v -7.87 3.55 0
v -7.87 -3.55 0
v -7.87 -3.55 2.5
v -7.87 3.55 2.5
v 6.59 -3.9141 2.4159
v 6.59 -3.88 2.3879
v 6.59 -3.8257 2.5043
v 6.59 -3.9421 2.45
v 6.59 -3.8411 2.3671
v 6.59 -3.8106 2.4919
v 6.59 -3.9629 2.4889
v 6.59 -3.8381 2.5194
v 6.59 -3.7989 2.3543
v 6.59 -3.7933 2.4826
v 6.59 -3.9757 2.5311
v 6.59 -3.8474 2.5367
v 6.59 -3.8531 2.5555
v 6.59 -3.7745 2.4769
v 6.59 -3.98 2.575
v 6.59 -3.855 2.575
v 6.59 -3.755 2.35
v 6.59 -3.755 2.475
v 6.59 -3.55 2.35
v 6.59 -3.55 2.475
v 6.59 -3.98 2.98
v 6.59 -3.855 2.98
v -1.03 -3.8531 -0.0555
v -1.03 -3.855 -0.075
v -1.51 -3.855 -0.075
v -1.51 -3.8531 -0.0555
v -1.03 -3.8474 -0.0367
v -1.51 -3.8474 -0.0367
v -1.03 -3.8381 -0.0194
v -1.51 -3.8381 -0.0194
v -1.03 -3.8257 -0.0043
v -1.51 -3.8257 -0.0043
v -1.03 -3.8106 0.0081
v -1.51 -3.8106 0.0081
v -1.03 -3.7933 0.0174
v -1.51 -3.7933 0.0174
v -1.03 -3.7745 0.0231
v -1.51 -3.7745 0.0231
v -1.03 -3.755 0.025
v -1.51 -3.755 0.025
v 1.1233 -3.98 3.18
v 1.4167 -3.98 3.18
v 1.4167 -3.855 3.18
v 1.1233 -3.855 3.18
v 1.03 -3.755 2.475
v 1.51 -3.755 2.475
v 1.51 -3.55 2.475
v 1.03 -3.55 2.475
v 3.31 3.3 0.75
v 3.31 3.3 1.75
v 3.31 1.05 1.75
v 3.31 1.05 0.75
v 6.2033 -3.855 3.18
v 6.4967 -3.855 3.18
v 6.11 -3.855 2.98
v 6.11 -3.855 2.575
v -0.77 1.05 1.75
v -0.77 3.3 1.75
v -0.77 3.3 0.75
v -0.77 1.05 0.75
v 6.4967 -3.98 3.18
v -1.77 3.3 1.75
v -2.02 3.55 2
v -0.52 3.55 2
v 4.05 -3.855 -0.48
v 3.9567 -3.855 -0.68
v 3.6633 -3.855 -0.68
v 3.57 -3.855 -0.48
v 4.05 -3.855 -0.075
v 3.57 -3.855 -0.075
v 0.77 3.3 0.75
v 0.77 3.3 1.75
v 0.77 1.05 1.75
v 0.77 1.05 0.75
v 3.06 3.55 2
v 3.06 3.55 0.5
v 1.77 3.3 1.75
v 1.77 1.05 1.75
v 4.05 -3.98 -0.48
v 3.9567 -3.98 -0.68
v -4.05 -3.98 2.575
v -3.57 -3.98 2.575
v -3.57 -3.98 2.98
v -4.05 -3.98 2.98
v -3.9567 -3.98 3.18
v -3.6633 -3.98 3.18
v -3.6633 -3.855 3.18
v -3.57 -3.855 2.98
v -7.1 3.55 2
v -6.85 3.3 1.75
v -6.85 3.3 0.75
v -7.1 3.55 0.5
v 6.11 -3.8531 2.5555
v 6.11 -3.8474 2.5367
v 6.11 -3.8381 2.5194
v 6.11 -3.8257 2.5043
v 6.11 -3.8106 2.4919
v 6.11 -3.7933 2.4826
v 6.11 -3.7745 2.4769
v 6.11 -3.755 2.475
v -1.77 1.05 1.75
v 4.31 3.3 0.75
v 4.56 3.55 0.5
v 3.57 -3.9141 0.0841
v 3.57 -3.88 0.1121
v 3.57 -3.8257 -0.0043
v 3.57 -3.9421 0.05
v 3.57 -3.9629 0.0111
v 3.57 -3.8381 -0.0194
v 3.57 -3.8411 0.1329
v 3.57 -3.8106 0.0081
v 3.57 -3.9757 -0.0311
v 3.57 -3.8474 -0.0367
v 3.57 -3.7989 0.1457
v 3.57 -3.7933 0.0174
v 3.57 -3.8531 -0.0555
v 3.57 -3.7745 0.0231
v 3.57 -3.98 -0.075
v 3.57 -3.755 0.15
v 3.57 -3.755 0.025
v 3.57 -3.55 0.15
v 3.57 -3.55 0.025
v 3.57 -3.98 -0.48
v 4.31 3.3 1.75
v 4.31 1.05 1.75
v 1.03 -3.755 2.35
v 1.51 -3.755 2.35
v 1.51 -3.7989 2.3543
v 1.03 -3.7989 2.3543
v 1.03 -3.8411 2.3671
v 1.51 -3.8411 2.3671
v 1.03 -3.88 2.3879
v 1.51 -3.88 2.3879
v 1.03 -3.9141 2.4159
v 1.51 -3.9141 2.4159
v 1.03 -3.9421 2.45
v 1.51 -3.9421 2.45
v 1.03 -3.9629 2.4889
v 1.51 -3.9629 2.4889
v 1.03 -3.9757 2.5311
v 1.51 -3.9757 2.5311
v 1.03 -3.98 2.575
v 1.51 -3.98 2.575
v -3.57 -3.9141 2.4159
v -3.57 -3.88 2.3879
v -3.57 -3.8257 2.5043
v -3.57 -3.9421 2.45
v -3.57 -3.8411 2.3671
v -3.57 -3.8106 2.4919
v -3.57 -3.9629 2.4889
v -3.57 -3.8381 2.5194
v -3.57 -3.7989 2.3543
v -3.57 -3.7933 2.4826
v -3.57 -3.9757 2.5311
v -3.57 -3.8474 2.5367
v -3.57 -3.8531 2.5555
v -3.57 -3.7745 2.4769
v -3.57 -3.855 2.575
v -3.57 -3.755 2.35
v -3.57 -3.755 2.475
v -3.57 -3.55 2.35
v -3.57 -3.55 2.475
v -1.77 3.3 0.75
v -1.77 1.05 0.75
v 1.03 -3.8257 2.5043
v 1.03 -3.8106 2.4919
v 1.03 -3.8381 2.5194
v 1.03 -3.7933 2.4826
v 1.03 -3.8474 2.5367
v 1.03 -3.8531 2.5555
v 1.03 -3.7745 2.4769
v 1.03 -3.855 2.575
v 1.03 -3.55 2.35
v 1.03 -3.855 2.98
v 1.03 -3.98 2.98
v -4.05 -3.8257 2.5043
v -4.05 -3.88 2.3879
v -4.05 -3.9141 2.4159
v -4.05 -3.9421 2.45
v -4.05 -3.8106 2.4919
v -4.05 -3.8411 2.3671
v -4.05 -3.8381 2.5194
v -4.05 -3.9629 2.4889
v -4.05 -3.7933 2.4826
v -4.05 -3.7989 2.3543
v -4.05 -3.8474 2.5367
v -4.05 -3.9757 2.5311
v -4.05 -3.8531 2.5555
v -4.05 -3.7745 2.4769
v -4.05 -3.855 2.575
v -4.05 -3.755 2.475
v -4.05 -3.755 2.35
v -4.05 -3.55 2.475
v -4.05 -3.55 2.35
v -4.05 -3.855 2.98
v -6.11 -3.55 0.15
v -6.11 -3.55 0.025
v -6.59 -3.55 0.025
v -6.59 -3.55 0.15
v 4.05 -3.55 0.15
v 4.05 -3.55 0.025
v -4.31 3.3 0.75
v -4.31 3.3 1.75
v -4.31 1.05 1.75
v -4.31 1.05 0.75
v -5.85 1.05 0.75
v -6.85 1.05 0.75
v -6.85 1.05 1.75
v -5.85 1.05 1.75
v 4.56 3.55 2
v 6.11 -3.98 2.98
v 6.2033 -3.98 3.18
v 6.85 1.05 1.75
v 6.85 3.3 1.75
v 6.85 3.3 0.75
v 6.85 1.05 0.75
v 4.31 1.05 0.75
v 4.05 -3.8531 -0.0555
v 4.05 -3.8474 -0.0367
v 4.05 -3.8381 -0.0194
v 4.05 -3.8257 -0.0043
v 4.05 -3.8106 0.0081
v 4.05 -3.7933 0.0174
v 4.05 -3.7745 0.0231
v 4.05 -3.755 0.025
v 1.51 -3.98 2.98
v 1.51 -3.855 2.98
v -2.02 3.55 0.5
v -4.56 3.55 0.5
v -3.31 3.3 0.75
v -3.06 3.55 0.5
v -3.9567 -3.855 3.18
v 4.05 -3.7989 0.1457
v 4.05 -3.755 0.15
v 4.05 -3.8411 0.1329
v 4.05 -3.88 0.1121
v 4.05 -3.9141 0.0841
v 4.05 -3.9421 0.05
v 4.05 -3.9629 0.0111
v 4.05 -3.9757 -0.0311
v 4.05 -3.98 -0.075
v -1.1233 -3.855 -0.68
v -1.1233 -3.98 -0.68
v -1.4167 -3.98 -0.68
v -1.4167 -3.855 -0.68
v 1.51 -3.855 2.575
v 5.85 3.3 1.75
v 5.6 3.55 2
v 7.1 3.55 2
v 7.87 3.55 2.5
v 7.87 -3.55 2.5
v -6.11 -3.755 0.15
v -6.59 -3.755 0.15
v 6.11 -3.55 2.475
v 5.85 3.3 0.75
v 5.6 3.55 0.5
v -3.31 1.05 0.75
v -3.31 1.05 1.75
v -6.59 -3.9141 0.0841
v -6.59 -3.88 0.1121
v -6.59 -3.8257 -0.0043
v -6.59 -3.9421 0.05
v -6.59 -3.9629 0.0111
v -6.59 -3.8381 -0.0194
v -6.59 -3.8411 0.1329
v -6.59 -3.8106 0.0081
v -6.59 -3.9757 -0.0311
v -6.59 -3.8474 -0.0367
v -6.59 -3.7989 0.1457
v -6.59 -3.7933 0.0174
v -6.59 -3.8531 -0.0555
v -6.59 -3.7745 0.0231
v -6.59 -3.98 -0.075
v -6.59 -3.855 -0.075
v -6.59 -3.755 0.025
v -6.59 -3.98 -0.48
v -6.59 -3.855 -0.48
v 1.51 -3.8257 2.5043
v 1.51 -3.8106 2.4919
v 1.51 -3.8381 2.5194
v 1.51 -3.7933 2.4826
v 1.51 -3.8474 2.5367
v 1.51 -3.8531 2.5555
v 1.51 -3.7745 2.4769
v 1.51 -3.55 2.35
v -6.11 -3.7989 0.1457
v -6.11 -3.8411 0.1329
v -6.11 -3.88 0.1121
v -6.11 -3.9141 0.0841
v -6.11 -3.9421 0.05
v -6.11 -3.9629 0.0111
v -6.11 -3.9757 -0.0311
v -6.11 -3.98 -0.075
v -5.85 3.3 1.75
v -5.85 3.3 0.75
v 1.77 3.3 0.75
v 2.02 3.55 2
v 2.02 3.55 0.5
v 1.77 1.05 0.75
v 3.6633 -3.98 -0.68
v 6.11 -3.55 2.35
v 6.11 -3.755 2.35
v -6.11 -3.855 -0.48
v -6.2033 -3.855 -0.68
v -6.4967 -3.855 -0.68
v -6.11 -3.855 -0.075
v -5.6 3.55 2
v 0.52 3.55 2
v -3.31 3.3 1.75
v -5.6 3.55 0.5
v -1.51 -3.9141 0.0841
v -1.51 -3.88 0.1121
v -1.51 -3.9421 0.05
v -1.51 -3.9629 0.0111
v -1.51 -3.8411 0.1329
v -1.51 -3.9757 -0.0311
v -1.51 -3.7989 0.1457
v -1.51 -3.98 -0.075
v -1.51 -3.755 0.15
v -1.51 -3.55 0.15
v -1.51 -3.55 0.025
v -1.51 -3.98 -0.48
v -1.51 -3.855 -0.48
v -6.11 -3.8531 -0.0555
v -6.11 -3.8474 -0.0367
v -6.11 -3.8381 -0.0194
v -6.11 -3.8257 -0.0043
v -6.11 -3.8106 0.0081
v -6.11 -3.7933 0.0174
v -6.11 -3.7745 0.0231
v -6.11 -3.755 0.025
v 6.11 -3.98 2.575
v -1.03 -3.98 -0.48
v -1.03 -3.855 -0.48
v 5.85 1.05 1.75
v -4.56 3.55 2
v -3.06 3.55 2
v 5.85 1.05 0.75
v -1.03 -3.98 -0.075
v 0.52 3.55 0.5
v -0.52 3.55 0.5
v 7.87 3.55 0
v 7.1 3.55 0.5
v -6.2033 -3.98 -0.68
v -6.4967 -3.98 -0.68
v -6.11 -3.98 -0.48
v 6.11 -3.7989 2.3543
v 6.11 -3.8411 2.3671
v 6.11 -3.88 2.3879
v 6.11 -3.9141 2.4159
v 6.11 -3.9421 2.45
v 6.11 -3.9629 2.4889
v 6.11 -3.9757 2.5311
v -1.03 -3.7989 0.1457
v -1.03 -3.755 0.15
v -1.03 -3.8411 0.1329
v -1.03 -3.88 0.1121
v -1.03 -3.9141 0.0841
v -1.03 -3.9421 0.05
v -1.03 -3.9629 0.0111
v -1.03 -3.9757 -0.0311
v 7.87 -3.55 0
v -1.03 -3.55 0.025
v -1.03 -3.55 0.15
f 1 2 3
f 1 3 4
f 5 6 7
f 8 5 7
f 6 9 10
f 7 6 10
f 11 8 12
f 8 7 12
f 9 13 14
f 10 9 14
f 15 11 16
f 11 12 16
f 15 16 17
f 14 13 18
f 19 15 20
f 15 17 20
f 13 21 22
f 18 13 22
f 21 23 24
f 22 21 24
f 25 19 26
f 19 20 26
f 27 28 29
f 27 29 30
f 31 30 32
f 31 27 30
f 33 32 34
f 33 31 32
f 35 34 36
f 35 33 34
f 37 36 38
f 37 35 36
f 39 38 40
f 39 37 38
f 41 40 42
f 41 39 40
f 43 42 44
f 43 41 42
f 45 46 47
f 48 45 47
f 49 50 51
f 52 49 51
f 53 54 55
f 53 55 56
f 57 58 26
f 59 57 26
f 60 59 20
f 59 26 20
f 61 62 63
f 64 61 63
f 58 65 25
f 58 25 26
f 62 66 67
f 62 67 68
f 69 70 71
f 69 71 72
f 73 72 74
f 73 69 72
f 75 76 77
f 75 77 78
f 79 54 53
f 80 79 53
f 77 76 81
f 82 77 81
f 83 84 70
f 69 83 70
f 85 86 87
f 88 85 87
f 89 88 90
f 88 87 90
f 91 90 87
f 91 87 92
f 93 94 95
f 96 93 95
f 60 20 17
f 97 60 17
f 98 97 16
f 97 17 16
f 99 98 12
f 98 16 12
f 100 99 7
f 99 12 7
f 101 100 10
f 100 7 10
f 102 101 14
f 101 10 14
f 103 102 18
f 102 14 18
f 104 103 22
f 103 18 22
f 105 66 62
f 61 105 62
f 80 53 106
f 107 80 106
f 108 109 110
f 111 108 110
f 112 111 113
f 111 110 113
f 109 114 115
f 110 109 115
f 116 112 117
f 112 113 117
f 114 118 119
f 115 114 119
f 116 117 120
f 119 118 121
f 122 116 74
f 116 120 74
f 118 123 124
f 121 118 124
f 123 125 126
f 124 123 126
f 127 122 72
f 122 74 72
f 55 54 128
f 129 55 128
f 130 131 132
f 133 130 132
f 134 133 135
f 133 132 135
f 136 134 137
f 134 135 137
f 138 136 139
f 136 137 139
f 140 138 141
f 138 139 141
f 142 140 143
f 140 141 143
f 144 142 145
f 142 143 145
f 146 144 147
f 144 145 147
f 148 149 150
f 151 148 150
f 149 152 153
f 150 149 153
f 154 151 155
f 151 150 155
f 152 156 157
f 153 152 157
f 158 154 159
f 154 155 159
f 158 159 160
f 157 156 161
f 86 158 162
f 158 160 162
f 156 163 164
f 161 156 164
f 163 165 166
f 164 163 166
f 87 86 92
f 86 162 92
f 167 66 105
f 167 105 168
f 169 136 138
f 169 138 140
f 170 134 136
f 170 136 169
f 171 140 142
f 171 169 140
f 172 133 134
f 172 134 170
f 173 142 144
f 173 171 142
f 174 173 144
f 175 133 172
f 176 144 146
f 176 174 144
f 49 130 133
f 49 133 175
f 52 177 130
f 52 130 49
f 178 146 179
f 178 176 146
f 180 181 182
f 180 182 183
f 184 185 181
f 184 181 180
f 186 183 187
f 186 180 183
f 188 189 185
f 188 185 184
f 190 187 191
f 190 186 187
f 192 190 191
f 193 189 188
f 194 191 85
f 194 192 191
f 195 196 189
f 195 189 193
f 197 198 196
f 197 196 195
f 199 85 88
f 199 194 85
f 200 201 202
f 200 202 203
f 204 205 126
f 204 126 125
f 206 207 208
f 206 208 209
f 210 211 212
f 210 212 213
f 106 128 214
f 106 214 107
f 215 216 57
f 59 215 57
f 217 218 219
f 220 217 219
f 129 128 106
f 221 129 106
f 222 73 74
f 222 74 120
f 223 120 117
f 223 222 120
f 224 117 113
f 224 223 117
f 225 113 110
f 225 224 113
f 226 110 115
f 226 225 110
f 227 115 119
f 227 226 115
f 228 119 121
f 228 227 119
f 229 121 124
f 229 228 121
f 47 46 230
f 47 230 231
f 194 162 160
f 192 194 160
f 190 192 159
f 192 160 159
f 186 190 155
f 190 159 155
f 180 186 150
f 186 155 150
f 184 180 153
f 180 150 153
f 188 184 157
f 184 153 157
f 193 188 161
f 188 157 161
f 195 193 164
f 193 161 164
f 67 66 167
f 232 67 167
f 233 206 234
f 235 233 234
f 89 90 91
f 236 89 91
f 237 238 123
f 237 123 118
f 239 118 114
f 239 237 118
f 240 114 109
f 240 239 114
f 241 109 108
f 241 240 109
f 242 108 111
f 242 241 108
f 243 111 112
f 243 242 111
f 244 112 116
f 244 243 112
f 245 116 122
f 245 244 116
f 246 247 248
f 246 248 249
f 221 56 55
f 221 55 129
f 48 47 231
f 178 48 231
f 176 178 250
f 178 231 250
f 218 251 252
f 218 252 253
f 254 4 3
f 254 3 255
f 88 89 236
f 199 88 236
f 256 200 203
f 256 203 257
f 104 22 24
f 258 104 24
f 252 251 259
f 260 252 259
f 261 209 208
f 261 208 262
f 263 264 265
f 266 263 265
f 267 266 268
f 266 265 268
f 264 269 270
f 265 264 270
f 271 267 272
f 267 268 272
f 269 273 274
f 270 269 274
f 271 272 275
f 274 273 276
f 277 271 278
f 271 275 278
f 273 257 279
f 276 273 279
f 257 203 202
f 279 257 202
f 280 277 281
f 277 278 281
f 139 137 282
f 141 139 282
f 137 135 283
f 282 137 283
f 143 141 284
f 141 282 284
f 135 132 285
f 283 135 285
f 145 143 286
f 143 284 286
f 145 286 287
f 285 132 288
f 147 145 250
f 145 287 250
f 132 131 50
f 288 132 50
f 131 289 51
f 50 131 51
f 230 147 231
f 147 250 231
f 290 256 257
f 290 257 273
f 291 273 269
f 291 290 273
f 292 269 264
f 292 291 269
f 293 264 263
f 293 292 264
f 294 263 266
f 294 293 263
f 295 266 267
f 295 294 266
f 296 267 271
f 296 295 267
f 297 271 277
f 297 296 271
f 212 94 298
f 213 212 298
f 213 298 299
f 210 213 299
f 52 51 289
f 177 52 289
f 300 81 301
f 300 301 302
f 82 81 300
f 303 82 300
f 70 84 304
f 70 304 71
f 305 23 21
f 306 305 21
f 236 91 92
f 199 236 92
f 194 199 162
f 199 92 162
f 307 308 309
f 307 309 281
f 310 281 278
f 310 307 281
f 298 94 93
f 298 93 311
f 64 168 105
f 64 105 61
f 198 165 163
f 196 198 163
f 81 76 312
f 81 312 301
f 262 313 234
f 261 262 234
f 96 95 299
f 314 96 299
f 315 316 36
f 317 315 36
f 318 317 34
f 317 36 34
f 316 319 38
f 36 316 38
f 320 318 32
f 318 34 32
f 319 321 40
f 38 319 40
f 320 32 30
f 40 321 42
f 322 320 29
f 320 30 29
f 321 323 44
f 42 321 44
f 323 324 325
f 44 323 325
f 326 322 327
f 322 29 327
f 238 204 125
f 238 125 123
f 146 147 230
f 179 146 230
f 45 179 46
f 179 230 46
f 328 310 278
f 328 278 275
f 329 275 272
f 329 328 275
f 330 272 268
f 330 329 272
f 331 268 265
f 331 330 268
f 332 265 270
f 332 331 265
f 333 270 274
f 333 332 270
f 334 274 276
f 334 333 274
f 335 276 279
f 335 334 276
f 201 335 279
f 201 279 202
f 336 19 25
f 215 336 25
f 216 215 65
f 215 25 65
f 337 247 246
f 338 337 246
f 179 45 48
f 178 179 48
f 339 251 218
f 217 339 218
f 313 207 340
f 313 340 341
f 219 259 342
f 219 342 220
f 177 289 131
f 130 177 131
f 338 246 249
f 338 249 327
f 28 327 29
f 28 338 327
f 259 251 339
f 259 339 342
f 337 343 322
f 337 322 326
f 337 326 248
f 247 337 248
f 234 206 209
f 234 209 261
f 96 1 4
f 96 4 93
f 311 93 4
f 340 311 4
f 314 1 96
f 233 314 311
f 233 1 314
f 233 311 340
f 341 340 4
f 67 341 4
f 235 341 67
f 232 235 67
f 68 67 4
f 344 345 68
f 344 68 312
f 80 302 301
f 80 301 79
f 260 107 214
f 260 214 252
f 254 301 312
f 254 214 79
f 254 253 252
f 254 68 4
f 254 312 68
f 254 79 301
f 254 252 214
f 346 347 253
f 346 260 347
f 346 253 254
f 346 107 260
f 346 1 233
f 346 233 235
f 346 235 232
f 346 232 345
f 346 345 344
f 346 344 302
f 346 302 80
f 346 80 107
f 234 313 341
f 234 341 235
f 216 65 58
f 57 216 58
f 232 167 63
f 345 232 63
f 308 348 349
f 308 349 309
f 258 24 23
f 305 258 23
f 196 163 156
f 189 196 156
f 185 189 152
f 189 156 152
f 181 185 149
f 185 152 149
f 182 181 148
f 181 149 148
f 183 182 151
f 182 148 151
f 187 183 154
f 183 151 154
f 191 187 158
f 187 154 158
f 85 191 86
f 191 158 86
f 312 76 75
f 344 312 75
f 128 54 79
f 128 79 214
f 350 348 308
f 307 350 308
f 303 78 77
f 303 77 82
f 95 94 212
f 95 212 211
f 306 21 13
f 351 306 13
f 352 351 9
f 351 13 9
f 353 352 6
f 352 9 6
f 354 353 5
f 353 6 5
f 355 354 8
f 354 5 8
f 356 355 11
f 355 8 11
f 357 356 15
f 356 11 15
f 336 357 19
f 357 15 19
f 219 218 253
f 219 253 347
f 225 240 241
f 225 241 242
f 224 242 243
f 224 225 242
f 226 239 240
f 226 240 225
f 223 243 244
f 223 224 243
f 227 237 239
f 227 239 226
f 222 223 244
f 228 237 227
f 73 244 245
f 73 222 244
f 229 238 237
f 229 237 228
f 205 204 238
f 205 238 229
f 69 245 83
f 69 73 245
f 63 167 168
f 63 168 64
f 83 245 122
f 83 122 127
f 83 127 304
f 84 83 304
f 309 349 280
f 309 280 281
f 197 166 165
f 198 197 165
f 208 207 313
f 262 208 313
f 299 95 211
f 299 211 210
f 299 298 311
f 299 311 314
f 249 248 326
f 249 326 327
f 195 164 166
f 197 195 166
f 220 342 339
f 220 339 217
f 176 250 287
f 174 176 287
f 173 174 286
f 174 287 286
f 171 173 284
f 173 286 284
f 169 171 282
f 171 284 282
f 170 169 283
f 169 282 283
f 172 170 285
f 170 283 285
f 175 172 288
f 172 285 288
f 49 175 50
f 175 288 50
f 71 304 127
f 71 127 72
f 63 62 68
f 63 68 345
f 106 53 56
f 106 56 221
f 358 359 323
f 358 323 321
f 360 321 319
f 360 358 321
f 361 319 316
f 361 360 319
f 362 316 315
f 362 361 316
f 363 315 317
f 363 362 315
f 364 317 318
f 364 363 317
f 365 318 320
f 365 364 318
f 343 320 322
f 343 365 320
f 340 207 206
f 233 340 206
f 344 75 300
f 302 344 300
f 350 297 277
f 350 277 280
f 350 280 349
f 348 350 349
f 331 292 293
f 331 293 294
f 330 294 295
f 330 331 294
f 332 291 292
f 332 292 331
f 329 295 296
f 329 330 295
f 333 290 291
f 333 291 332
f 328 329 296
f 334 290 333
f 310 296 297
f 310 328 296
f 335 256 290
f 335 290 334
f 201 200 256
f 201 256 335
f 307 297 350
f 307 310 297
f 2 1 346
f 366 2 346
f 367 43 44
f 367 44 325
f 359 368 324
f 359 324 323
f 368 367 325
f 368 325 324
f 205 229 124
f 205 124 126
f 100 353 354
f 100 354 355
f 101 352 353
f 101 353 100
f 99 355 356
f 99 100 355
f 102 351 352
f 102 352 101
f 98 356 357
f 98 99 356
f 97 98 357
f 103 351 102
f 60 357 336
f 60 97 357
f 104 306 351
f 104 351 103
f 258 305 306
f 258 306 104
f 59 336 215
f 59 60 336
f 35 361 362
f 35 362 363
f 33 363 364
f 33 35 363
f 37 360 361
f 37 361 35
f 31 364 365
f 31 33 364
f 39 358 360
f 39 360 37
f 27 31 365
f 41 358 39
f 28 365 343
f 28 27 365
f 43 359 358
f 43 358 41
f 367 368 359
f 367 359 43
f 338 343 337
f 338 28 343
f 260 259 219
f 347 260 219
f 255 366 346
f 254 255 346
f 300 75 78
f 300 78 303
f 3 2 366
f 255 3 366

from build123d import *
from OCP.BRepFilletAPI import BRepFilletAPI_MakeChamfer

# Parameters (mm, degrees)
SKETCH1_W                  = 15.74
SKETCH1_H                  = 7.1
BOSS_EXTRUDE1_DEPTH        = 2.5
SKETCH2_W                  = 1
SKETCH2_H                  = 1
CUT_EXTRUDE1_DEPTH         = 2.5
CHAMFER1_SIZE              = 0.25
LPATTERN6_COUNT            = 6
LPATTERN6_PITCH            = 2.54
CHAMFER1_OF_LPATTERN6_SIZE = 0.25
BASE_FLANGE2_DEPTH         = 0.24
BASE_FLANGE2_DEPTH_BACK    = 0.24
BASE_FLANGE3_DEPTH         = 0.24
BASE_FLANGE3_DEPTH_BACK    = 0.24
CHAMFER3_SIZE              = 0.2
CHAMFER3_SIZE2             = 0.093261532
CHAMFER4_SIZE              = 0.2
CHAMFER4_SIZE2             = 0.093261532
LPATTERN4_COUNT            = 3
LPATTERN4_PITCH            = 5.08
LPATTERN3_COUNT            = 3
LPATTERN3_PITCH            = 5.08


# Sheet-metal steps are written as plain solids
with BuildPart() as part:
    # Sketch1 → Boss-Extrude1 (new body)
    with BuildSketch(Plane.XY):
        Rectangle(SKETCH1_W, SKETCH1_H)
    extrude(amount=BOSS_EXTRUDE1_DEPTH)

    # Sketch2 → Cut-Extrude1 (cut)
    with BuildSketch(Plane(origin=(0, 3.55, 0), x_dir=(1, 0, 0), z_dir=(0, 1, 0))):
        with Locations((-6.35, -1.25)):
            Rectangle(SKETCH2_W, SKETCH2_H)
    cut_extrude1 = extrude(amount=-CUT_EXTRUDE1_DEPTH, mode=Mode.SUBTRACT)

    # Chamfer1
    chamfer1_edges = [part.edges().sort_by_distance(p)[0] for p in [
        (-5.85, 3.55, 1.25),
        (-6.35, 3.55, 0.75),
        (-6.85, 3.55, 1.25),
        (-6.35, 3.55, 1.75),
    ]]
    chamfer(chamfer1_edges, length=CHAMFER1_SIZE)

    # LPattern6: Cut-Extrude1 ×6
    with Locations(*[(i * LPATTERN6_PITCH, 0, 0) for i in range(1, LPATTERN6_COUNT)]):
        add(cut_extrude1, mode=Mode.SUBTRACT)

    # Chamfer1 of LPattern6
    chamfer1_of_lpattern6_edges = [part.edges().sort_by_distance(p)[0] for p in [
        (-3.31, 3.55, 1.25),
        (-3.81, 3.55, 0.75),
        (-4.31, 3.55, 1.25),
        (-3.81, 3.55, 1.75),
        (-0.77, 3.55, 1.25),
        (-1.27, 3.55, 0.75),
        (-1.77, 3.55, 1.25),
        (-1.27, 3.55, 1.75),
        (1.77, 3.55, 1.25),
        (1.27, 3.55, 0.75),
        (0.77, 3.55, 1.25),
        (1.27, 3.55, 1.75),
        (4.31, 3.55, 1.25),
        (3.81, 3.55, 0.75),
        (3.31, 3.55, 1.25),
        (3.81, 3.55, 1.75),
        (6.85, 3.55, 1.25),
        (6.35, 3.55, 0.75),
        (5.85, 3.55, 1.25),
        (6.35, 3.55, 1.75),
    ]]
    chamfer(chamfer1_of_lpattern6_edges, length=CHAMFER1_OF_LPATTERN6_SIZE)


with BuildPart() as body_2:
    # Sketch5 → Base-Flange2 (new, two sides: drawn at the far end of the back side and taken through both)
    with BuildSketch(Plane.ZY.offset(6.35).offset(-BASE_FLANGE2_DEPTH_BACK)):
        with BuildLine():
            Line((0.15, -3.55), (0.15, -3.755))
            ThreePointArc((0.15, -3.755), (0.084099026, -3.914099026), (-0.075, -3.98))
            Line((-0.075, -3.98), (-0.68, -3.98))
            Line((-0.68, -3.98), (-0.68, -3.855))
            Line((-0.68, -3.855), (-0.075, -3.855))
            ThreePointArc((-0.075, -3.855), (-0.004289322, -3.825710678), (0.025, -3.755))
            Line((0.025, -3.755), (0.025, -3.55))
            Line((0.025, -3.55), (0.15, -3.55))
        make_face()
    extrude(amount=BASE_FLANGE2_DEPTH + BASE_FLANGE2_DEPTH_BACK)

    # Chamfer4: one chamfer whose edges measure the first distance from different faces: ONE call of the kernel's chamfer builder (chamfer() names one face for all edges)
    chamfer4_edges_1 = [body_2.edges().sort_by_distance(p)[0] for p in [
        (-6.11, -3.9175, -0.68),
    ]]
    chamfer4_side_1 = [body_2.faces().sort_by_distance(p)[0] for p in [
        (-6.11, -3.6525, 0.034347727),
    ]]
    chamfer4_edges_2 = [body_2.edges().sort_by_distance(p)[0] for p in [
        (-6.59, -3.9175, -0.68),
    ]]
    chamfer4_side_2 = [body_2.faces().sort_by_distance(p)[0] for p in [
        (-6.59, -3.6525, 0.034347727),
    ]]
    chamfer4 = BRepFilletAPI_MakeChamfer(body_2.part.solid().wrapped)
    for e in chamfer4_edges_1:
        chamfer4.Add(CHAMFER4_SIZE, CHAMFER4_SIZE2, e.wrapped, chamfer4_side_1[0].wrapped)  # the first distance lies on this face
    for e in chamfer4_edges_2:
        chamfer4.Add(CHAMFER4_SIZE, CHAMFER4_SIZE2, e.wrapped, chamfer4_side_2[0].wrapped)  # the first distance lies on this face
    add(Compound.cast(chamfer4.Shape()), mode=Mode.REPLACE)


with BuildPart() as body_3:
    # Sketch22 → Base-Flange3 (new, two sides: drawn at the far end of the back side and taken through both)
    with BuildSketch(Plane.ZY.offset(3.81).offset(-BASE_FLANGE3_DEPTH_BACK)):
        with BuildLine():
            Line((2.35, -3.55), (2.35, -3.755))
            ThreePointArc((2.35, -3.755), (2.415900974, -3.914099026), (2.575, -3.98))
            Line((2.575, -3.98), (3.18, -3.98))
            Line((3.18, -3.98), (3.18, -3.855))
            Line((3.18, -3.855), (2.575, -3.855))
            ThreePointArc((2.575, -3.855), (2.504289322, -3.825710678), (2.475, -3.755))
            Line((2.475, -3.755), (2.475, -3.55))
            Line((2.475, -3.55), (2.35, -3.55))
        make_face()
    extrude(amount=BASE_FLANGE3_DEPTH + BASE_FLANGE3_DEPTH_BACK)

    # Chamfer3: one chamfer whose edges measure the first distance from different faces: ONE call of the kernel's chamfer builder (chamfer() names one face for all edges)
    chamfer3_edges_1 = [body_3.edges().sort_by_distance(p)[0] for p in [
        (-3.57, -3.9175, 3.18),
    ]]
    chamfer3_side_1 = [body_3.faces().sort_by_distance(p)[0] for p in [
        (-3.57, -3.6525, 2.465652273),
    ]]
    chamfer3_edges_2 = [body_3.edges().sort_by_distance(p)[0] for p in [
        (-4.05, -3.9175, 3.18),
    ]]
    chamfer3_side_2 = [body_3.faces().sort_by_distance(p)[0] for p in [
        (-4.05, -3.6525, 2.465652273),
    ]]
    chamfer3 = BRepFilletAPI_MakeChamfer(body_3.part.solid().wrapped)
    for e in chamfer3_edges_1:
        chamfer3.Add(CHAMFER3_SIZE, CHAMFER3_SIZE2, e.wrapped, chamfer3_side_1[0].wrapped)  # the first distance lies on this face
    for e in chamfer3_edges_2:
        chamfer3.Add(CHAMFER3_SIZE, CHAMFER3_SIZE2, e.wrapped, chamfer3_side_2[0].wrapped)  # the first distance lies on this face
    add(Compound.cast(chamfer3.Shape()), mode=Mode.REPLACE)


with BuildPart() as lpattern4_1:
    # LPattern4: pattern copy
    add(body_2.part.moved(Location(Vector(1, 0, 0) * (1 * LPATTERN4_PITCH))))


with BuildPart() as lpattern4_2:
    # LPattern4: pattern copy
    add(body_2.part.moved(Location(Vector(1, 0, 0) * (2 * LPATTERN4_PITCH))))


with BuildPart() as lpattern3_1:
    # LPattern3: pattern copy
    add(body_3.part.moved(Location(Vector(1, 0, 0) * (1 * LPATTERN3_PITCH))))


with BuildPart() as lpattern3_2:
    # LPattern3: pattern copy
    add(body_3.part.moved(Location(Vector(1, 0, 0) * (2 * LPATTERN3_PITCH))))


solid = Compound([part.part, body_2.part, body_3.part, lpattern4_1.part, lpattern4_2.part, lpattern3_1.part, lpattern3_2.part])
